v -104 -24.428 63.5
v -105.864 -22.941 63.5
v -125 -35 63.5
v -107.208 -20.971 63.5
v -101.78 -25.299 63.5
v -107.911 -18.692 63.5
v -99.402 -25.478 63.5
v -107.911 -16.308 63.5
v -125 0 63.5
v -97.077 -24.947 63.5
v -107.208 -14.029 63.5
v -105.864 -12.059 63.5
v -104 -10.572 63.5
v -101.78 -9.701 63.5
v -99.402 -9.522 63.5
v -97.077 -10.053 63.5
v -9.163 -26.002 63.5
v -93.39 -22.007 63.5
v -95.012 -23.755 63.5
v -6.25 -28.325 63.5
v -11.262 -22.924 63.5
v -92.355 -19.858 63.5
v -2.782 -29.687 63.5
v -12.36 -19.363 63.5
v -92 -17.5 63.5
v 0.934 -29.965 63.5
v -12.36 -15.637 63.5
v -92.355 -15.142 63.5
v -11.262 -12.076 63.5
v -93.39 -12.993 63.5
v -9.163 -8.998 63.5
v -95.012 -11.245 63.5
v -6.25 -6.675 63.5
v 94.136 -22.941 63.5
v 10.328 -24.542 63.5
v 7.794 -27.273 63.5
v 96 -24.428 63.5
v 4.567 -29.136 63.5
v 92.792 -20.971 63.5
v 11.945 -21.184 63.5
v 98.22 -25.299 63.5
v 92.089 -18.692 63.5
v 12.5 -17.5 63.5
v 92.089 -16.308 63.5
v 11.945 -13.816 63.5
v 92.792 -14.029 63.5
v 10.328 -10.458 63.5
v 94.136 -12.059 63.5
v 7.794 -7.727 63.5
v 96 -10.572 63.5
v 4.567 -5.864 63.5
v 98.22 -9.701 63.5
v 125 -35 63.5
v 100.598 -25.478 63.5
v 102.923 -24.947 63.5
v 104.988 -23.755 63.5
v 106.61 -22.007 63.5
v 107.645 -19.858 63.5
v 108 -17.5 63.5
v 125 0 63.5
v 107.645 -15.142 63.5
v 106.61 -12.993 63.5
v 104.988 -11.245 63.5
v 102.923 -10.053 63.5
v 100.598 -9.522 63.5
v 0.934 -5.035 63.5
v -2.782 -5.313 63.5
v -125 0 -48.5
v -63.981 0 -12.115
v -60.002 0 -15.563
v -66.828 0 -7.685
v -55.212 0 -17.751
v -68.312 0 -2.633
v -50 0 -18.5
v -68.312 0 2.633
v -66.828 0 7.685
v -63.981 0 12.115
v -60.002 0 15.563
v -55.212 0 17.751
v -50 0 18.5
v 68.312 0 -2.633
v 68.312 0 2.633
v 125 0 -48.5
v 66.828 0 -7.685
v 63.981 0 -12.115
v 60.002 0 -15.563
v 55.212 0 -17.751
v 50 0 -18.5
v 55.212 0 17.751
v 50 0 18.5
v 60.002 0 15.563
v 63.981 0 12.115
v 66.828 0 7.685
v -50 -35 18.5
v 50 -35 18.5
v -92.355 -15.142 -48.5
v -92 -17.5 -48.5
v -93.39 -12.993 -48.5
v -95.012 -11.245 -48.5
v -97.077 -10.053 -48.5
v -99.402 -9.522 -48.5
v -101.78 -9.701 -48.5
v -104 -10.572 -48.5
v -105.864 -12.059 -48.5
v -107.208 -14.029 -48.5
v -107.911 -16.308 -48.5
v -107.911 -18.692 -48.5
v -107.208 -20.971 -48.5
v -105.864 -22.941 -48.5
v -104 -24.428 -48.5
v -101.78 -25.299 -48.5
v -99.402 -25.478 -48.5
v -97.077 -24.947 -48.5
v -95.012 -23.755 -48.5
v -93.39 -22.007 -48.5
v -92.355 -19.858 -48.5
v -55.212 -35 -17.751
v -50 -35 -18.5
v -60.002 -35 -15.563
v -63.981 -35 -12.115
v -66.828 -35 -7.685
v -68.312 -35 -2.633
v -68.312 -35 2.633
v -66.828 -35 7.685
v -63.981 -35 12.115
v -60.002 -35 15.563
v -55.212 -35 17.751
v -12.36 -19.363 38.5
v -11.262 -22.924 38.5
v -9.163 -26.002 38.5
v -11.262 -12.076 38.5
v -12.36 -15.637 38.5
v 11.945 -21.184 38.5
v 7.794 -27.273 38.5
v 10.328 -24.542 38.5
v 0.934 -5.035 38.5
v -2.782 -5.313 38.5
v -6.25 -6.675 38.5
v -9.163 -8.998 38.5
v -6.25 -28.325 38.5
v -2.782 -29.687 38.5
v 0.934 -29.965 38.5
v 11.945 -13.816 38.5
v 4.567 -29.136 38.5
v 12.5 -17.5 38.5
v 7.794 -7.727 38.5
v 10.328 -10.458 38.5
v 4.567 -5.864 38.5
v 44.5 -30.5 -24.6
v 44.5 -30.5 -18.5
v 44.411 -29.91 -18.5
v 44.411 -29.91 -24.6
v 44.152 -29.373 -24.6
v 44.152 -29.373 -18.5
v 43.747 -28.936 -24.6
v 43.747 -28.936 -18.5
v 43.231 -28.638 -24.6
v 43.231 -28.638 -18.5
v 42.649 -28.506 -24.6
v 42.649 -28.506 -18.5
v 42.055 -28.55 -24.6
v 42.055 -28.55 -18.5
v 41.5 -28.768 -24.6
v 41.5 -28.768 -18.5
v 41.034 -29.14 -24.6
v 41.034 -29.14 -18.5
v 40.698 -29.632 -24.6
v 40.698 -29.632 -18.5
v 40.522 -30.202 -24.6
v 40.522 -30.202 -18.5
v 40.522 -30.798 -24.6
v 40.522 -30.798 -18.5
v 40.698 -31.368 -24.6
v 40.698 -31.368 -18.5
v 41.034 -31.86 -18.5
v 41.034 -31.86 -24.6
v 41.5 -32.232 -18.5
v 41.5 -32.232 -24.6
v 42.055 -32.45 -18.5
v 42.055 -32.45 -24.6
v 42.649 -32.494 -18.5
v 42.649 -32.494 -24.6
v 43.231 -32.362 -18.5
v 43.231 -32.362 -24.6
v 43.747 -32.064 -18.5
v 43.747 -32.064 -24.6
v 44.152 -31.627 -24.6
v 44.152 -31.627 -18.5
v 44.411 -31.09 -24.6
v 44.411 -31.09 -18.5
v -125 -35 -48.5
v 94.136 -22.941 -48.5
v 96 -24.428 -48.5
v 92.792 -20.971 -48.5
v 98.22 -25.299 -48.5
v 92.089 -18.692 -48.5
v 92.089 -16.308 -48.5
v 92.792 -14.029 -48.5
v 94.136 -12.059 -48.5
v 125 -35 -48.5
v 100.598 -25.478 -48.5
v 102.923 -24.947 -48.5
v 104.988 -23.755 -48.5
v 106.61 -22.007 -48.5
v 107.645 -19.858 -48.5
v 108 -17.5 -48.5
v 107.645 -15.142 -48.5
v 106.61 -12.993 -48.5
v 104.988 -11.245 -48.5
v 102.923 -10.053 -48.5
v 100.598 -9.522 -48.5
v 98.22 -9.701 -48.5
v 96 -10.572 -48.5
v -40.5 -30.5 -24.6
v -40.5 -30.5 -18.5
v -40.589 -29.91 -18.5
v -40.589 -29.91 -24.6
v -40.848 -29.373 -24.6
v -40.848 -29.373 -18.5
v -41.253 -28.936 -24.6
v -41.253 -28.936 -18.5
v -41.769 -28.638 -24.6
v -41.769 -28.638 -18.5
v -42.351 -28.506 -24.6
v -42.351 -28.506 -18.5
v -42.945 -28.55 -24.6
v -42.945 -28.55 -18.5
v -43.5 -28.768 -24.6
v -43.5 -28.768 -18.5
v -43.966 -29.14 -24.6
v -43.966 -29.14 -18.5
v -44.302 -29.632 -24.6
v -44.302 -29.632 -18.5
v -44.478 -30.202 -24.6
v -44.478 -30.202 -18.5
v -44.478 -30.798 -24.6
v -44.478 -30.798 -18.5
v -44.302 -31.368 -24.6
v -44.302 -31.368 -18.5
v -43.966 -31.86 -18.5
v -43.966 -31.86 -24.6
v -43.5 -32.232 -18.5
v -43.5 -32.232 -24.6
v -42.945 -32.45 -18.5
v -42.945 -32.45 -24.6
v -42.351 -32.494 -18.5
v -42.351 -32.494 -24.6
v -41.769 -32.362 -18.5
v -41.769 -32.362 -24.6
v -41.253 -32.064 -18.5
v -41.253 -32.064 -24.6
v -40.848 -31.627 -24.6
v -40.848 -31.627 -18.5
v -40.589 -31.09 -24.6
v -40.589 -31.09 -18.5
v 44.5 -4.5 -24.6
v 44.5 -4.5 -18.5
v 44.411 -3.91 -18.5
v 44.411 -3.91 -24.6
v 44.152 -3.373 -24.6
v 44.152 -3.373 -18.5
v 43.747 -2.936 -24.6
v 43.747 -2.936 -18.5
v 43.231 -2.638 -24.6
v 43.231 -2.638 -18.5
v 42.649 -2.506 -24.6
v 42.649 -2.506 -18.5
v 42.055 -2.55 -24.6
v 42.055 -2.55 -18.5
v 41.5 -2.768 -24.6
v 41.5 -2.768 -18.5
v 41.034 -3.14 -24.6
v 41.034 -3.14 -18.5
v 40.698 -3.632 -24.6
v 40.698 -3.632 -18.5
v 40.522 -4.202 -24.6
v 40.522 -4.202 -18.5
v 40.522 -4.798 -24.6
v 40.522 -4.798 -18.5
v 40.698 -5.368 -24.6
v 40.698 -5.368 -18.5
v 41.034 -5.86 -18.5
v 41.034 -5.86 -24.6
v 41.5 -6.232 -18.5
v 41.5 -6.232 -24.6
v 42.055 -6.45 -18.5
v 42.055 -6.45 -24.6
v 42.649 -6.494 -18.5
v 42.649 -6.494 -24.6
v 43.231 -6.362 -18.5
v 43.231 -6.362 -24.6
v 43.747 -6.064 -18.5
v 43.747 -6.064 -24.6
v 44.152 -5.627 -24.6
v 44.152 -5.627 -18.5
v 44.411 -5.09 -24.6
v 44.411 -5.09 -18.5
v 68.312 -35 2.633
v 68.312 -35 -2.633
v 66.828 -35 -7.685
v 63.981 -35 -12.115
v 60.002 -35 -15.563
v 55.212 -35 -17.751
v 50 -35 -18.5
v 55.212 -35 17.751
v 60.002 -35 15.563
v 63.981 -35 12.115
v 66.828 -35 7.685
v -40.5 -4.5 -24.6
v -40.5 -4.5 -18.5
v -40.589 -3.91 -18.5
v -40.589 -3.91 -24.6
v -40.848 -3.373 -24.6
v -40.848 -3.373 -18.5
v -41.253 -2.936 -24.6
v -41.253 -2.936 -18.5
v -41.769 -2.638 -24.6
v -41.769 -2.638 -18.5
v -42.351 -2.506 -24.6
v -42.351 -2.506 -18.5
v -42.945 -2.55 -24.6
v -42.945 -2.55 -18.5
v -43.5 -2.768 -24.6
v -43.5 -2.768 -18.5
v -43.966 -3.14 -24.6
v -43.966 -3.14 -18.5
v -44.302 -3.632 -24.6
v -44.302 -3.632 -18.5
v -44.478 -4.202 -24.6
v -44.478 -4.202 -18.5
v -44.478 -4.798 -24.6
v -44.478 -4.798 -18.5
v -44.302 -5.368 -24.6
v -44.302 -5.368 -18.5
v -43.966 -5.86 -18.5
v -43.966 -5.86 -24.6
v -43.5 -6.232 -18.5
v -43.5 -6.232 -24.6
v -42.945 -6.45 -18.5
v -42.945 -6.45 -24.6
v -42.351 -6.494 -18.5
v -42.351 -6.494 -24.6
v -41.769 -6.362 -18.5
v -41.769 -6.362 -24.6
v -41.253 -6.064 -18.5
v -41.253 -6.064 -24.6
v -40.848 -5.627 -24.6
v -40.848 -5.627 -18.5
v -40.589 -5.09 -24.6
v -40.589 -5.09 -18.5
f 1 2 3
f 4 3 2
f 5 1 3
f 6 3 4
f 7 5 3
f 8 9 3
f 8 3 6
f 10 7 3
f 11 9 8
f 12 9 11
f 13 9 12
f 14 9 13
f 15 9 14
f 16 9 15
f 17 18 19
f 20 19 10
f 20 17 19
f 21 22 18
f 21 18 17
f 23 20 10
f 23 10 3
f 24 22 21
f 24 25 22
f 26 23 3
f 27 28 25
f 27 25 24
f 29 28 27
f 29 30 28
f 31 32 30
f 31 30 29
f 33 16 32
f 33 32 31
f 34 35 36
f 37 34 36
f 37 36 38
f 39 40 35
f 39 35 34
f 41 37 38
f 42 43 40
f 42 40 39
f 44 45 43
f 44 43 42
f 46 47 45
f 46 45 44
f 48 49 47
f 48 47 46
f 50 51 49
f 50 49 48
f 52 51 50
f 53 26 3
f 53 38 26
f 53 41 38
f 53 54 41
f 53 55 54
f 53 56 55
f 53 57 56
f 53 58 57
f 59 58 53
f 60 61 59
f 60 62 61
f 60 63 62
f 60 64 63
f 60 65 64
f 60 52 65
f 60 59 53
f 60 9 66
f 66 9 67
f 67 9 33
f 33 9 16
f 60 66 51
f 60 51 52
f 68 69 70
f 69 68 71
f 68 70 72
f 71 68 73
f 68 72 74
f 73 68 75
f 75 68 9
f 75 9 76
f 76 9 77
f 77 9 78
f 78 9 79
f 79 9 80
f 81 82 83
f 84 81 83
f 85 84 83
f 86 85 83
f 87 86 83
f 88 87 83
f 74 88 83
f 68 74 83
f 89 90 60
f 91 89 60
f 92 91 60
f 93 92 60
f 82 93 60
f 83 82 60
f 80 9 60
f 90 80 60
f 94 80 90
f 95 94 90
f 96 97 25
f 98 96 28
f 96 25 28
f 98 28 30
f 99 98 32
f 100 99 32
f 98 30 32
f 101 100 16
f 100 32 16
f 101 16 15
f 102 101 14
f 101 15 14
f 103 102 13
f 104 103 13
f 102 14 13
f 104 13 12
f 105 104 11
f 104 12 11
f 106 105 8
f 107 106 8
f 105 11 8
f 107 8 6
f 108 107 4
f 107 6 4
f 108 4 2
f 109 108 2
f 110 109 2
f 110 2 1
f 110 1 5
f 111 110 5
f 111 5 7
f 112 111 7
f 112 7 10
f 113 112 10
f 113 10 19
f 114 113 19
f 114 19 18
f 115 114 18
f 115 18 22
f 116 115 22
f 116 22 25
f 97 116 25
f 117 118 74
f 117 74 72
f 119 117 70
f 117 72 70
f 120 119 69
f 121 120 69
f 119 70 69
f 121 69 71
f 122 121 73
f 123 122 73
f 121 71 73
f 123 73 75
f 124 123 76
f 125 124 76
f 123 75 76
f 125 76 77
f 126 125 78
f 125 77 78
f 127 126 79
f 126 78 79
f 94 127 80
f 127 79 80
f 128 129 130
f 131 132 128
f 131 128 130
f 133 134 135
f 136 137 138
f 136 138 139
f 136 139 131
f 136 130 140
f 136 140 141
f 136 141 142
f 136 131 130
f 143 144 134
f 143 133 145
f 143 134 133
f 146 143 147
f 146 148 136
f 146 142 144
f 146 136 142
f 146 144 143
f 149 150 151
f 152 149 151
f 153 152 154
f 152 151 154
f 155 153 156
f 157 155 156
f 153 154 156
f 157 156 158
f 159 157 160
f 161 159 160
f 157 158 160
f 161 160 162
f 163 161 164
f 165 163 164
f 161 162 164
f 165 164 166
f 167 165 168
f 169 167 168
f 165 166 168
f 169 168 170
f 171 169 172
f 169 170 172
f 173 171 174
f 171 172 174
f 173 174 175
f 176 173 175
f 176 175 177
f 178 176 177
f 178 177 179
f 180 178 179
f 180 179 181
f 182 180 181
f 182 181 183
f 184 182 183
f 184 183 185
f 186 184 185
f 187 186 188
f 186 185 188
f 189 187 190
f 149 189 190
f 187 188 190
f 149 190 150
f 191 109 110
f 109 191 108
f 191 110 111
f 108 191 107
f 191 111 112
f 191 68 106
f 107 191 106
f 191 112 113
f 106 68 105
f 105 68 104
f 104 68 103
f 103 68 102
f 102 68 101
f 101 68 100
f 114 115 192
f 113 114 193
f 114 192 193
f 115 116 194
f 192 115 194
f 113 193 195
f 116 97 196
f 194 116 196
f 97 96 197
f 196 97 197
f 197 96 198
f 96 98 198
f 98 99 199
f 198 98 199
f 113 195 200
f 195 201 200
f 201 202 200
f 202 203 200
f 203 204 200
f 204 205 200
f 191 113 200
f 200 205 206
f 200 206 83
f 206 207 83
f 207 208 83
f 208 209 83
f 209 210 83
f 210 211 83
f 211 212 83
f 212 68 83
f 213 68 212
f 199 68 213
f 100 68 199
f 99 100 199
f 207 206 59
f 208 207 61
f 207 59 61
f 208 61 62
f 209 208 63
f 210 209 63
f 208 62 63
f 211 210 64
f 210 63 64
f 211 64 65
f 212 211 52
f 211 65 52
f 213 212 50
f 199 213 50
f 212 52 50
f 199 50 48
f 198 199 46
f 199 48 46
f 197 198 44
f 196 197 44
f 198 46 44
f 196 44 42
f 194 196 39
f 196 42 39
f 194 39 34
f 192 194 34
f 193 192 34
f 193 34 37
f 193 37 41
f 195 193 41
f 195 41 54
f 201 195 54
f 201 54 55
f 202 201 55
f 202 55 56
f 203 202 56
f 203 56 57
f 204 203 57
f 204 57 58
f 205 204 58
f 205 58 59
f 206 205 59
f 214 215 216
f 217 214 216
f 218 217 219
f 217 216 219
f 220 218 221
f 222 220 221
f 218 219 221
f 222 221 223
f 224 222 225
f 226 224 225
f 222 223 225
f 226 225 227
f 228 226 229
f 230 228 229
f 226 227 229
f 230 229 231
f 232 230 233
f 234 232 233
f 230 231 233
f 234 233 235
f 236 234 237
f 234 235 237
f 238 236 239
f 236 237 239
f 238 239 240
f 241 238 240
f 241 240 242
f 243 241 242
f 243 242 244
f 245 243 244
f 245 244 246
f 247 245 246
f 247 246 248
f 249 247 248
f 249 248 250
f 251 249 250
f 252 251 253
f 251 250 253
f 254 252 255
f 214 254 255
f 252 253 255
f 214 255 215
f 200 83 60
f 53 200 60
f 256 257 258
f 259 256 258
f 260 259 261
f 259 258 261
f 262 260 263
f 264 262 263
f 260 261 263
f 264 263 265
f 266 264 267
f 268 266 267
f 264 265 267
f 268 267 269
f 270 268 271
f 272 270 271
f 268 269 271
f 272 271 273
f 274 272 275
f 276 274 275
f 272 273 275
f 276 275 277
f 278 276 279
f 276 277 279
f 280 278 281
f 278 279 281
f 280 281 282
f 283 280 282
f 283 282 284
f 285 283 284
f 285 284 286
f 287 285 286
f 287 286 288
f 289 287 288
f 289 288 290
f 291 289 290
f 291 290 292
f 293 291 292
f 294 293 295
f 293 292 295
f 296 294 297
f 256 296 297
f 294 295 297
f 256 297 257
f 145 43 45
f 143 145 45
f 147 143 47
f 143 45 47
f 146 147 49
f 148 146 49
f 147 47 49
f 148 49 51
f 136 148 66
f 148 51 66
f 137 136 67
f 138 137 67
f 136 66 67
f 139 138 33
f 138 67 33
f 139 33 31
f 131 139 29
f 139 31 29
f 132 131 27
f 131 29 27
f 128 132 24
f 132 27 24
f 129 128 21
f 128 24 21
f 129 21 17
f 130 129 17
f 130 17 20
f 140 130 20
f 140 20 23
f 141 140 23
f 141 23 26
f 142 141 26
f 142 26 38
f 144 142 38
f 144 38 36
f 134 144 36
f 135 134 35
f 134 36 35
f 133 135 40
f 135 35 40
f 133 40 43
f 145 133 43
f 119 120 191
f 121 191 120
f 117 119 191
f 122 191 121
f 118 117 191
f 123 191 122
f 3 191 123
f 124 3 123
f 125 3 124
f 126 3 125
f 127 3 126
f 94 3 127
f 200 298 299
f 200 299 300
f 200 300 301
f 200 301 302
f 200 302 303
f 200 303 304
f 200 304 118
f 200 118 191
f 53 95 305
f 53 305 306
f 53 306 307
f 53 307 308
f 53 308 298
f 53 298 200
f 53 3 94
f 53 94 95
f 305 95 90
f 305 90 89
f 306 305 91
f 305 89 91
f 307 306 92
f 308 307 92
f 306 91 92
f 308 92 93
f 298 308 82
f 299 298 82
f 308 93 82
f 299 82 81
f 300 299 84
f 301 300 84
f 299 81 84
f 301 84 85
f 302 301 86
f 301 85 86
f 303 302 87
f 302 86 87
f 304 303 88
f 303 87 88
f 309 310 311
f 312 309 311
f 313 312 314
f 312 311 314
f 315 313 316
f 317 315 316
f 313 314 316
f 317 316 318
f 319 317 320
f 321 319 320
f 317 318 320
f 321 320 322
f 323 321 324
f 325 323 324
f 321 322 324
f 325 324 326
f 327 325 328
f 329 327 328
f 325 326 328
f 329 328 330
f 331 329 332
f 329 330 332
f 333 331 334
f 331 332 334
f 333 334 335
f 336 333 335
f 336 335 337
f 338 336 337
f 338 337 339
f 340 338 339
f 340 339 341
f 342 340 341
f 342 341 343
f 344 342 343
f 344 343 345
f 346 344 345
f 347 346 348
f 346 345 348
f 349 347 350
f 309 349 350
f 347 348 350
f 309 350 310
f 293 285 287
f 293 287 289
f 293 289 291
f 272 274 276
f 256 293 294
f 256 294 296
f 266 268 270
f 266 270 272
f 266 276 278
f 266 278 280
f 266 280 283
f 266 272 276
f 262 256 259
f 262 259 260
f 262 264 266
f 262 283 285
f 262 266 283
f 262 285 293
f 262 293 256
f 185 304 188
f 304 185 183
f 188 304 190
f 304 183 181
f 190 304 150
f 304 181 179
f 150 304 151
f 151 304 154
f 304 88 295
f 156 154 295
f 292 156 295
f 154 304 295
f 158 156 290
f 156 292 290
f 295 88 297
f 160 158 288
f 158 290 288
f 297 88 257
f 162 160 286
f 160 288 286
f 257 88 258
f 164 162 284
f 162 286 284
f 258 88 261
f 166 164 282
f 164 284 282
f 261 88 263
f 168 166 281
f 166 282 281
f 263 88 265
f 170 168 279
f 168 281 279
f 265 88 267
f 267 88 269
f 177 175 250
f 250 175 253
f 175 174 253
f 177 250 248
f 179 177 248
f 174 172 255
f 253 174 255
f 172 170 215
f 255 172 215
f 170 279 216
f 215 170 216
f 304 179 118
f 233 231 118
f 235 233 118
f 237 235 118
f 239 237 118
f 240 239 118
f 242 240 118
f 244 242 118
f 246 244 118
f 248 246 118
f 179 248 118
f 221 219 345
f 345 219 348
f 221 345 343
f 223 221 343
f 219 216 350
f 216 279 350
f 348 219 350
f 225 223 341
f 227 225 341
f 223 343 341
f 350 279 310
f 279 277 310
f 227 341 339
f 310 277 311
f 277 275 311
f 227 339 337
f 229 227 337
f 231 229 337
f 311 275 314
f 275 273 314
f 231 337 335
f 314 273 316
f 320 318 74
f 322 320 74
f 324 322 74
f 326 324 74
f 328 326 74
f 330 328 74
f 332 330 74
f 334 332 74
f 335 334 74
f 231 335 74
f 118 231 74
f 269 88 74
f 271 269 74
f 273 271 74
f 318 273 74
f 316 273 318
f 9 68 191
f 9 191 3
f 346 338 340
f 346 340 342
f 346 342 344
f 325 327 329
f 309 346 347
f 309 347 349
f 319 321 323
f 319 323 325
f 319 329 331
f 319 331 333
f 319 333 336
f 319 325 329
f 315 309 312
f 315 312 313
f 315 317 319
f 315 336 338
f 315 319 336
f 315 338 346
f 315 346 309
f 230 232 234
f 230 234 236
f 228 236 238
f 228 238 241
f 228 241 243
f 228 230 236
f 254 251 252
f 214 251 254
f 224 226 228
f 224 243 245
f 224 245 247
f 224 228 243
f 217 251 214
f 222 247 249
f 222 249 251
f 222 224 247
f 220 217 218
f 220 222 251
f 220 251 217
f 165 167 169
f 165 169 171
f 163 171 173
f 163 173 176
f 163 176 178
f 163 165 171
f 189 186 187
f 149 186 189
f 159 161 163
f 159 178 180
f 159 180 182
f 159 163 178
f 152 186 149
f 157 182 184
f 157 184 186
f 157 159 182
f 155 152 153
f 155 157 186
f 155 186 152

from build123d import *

# Parameters (mm, degrees)
F0_W     = 250
F0_H     = 112
F1_DEPTH = 35
F2_R     = 8
F3_DEPTH = 400
F4_R     = 12.5
F5_DEPTH = 25
F6_R     = 2
F7_DEPTH = 6.1


with BuildPart() as f1:
    # F0 (on Front) → F1 (new body)
    with BuildSketch(Plane.XZ):
        with Locations((0, 7.5)):
            Rectangle(F0_W, F0_H)
        with BuildLine():
            Line((50, -18.5), (-50, -18.5))
            ThreePointArc((-50, -18.5), (-68.5, 0), (-50, 18.5))
            Line((-50, 18.5), (50, 18.5))
            ThreePointArc((50, 18.5), (68.5, 0), (50, -18.5))
        make_face(mode=Mode.SUBTRACT)
    extrude(amount=F1_DEPTH)

    # F2 (on face) → F3 (cut)
    with BuildSketch(Plane.XY.offset(63.5)):
        with Locations((-100, -17.5)):
            Circle(F2_R)
        with Locations((100, -17.5)):
            Circle(F2_R)
    extrude(amount=-F3_DEPTH, mode=Mode.SUBTRACT)

    # F4 (on face) → F5 (cut)
    with BuildSketch(Plane.XY.offset(63.5)):
        with Locations((0, -17.5)):
            Circle(F4_R)
    extrude(amount=-F5_DEPTH, mode=Mode.SUBTRACT)

    # F6 (on face) → F7 (cut)
    with BuildSketch(Plane.XY.offset(-18.5)):
        with Locations((-42.5, -4.5)):
            Circle(F6_R)
        with Locations((-42.5, -30.5)):
            Circle(F6_R)
        with Locations((42.5, -4.5)):
            Circle(F6_R)
        with Locations((42.5, -30.5)):
            Circle(F6_R)
    extrude(amount=-F7_DEPTH, mode=Mode.SUBTRACT)


solid = f1.part
